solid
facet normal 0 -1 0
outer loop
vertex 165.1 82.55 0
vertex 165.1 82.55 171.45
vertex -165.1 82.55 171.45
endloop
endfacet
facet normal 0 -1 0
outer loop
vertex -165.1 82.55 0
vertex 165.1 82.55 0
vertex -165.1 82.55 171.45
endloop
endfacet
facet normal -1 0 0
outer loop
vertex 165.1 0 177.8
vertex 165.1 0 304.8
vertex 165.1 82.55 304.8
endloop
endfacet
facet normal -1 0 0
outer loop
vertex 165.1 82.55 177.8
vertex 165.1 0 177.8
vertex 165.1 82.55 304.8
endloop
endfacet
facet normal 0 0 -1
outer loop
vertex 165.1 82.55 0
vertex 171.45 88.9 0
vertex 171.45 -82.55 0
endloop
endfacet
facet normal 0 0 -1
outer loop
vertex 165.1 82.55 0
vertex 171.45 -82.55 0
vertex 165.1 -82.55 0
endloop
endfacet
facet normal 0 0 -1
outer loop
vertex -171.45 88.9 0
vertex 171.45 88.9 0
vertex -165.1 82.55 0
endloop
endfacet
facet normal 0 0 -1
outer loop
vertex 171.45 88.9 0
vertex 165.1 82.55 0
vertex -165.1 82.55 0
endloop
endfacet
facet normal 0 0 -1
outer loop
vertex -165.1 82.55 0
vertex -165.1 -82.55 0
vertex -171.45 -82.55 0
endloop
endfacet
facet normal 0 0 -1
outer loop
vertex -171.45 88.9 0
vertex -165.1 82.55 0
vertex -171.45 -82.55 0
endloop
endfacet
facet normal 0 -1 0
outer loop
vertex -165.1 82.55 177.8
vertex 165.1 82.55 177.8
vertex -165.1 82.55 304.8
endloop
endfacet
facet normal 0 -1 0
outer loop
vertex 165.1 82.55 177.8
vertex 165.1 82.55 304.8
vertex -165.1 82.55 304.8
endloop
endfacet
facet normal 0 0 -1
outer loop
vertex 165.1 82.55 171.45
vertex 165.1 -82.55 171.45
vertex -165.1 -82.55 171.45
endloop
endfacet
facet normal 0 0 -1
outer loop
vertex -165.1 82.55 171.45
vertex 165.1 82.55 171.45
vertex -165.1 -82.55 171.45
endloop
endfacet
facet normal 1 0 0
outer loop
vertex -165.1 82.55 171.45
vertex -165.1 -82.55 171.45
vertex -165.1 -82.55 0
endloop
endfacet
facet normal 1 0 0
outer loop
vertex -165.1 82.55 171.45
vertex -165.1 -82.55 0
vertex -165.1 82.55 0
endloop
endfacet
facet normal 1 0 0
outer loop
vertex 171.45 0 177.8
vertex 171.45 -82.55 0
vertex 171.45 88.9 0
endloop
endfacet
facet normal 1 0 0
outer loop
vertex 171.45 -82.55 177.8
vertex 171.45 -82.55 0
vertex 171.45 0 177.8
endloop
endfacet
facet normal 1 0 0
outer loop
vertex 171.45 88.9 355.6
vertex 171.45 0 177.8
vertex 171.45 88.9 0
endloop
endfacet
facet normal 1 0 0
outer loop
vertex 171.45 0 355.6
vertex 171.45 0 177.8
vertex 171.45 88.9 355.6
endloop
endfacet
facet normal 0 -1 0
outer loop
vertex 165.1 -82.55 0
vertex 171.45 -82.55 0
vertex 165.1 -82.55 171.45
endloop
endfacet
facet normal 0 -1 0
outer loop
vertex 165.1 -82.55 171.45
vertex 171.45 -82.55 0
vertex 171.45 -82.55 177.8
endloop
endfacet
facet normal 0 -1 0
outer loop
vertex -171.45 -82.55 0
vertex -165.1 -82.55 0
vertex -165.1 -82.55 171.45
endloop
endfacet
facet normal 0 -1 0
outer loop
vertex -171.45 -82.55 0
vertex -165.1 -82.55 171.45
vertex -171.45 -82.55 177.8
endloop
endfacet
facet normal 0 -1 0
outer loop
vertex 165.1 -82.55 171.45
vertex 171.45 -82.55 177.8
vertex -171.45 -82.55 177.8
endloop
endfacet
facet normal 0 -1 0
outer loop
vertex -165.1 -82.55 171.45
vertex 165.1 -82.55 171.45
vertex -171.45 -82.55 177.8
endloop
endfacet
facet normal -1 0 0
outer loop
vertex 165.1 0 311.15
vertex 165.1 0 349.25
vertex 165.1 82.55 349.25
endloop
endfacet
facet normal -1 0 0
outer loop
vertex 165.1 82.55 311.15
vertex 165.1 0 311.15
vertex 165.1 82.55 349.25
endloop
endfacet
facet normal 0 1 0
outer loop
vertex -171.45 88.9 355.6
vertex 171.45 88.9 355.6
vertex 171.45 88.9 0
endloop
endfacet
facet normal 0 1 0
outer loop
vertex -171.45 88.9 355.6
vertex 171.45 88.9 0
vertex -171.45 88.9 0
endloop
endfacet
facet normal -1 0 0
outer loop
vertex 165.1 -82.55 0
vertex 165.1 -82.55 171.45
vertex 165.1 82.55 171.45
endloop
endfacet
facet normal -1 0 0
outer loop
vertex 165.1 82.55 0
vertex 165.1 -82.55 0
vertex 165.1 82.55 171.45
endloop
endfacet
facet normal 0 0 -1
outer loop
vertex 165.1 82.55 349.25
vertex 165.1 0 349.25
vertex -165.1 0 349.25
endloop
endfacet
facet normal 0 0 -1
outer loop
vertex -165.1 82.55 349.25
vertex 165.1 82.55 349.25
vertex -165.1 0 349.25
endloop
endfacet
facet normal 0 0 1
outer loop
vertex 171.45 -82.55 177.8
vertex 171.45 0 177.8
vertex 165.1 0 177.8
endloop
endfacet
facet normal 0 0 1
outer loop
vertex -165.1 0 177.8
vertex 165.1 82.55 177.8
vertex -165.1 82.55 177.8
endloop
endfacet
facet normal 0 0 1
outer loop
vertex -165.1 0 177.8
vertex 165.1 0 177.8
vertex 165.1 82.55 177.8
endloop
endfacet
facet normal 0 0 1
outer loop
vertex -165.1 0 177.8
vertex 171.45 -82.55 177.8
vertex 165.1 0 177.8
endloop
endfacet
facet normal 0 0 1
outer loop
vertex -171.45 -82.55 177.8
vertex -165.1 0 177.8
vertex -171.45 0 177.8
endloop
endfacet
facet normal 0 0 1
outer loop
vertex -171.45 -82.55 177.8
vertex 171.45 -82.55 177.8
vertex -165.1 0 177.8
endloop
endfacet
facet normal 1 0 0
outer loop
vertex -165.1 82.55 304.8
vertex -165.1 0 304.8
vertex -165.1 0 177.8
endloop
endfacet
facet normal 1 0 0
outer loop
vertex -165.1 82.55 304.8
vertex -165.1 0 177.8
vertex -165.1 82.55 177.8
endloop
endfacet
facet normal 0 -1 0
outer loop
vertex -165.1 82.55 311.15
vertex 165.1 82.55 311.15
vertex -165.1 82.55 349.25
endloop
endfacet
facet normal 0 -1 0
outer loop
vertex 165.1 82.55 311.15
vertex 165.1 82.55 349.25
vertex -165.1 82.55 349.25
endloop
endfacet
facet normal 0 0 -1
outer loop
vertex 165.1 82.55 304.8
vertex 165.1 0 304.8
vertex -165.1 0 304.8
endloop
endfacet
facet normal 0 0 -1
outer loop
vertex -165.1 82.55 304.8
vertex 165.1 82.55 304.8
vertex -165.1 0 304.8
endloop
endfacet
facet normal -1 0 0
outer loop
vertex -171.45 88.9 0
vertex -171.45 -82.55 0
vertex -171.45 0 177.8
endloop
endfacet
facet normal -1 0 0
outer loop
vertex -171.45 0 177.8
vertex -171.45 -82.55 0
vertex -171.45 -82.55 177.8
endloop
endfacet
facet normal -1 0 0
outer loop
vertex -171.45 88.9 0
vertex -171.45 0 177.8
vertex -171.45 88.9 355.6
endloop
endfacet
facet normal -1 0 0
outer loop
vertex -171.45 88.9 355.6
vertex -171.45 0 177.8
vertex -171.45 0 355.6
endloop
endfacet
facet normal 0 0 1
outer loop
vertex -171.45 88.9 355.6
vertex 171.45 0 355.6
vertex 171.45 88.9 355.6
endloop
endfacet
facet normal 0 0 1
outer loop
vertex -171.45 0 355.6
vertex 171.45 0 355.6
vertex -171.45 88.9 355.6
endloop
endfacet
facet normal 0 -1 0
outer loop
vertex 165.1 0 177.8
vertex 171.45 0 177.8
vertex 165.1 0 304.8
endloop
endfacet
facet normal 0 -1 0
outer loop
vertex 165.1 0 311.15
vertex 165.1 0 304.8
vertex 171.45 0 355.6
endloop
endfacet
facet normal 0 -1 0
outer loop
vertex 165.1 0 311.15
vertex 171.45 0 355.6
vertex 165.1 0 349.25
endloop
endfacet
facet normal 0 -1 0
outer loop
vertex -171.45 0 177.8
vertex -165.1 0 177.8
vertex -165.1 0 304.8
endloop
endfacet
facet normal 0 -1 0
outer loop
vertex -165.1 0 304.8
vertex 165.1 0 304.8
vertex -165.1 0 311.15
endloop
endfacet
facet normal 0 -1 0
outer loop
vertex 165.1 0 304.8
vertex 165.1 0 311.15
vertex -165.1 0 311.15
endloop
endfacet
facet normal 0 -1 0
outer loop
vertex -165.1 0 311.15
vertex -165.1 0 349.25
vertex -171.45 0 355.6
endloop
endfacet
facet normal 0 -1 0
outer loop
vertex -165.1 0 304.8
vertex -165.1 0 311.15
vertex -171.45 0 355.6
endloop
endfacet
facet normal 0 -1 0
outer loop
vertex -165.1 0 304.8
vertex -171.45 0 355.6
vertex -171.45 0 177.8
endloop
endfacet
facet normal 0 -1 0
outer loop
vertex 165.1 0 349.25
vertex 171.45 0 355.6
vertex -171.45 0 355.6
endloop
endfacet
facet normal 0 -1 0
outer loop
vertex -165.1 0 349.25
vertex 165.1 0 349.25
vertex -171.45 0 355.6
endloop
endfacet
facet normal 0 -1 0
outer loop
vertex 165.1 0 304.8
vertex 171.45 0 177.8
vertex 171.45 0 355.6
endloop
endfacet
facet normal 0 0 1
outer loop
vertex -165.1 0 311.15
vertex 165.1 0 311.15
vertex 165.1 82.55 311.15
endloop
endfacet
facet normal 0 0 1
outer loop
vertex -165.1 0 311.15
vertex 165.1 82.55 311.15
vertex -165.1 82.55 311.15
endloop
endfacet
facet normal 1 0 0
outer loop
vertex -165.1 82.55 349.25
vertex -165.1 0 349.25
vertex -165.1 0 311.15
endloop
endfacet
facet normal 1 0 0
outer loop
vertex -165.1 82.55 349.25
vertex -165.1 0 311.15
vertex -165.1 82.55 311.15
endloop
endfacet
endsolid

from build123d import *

# Parameters (mm, degrees)
F2_DEPTH = 6.35
F3_W     = 165.1
F3_H     = 6.35
F4_DEPTH = 165.1
F5_W     = 165.1
F5_H     = 6.35
F6_DEPTH = 82.55
F8_W     = 342.9
F8_H     = 355.6
F9_DEPTH = 6.35


with BuildPart() as f2:
    # F1 (on offset) → F2 (new body)
    with BuildSketch(Plane.YZ.offset(165.1)):
        Polygon((-82.55, 177.8), (-82.55, 0), (82.55, 0), (82.55, 355.6), (0, 355.6), (0, 177.8), align=None)
    extrude(amount=F2_DEPTH)

    # F3 (on face) → F4 (join, through all)
    with BuildSketch(Plane.XZ.offset(82.55)):
        with Locations((82.55, 174.625)):
            Rectangle(F3_W, F3_H)
    extrude(amount=-F4_DEPTH)

    # F5 (on face) → F6 (join, through all)
    with BuildSketch(Plane.XZ):
        with Locations((82.55, 352.425)):
            Rectangle(F5_W, F5_H)
        with Locations((82.55, 307.975)):
            Rectangle(F5_W, F5_H)
    extrude(amount=-F6_DEPTH)

    # F7: F2 across plane


with BuildPart() as f2_1:
    add(f2.part)
    add(f2.part.mirror(Plane.YZ))

    # F8 (on face) → F9 (join)
    with BuildSketch(Plane(origin=(0, 82.55, 0), x_dir=(-1, 0, 0), z_dir=(0, 1, 0))):
        with Locations((0, 177.8)):
            Rectangle(F8_W, F8_H)
    extrude(amount=F9_DEPTH)


solid = f2_1.part
